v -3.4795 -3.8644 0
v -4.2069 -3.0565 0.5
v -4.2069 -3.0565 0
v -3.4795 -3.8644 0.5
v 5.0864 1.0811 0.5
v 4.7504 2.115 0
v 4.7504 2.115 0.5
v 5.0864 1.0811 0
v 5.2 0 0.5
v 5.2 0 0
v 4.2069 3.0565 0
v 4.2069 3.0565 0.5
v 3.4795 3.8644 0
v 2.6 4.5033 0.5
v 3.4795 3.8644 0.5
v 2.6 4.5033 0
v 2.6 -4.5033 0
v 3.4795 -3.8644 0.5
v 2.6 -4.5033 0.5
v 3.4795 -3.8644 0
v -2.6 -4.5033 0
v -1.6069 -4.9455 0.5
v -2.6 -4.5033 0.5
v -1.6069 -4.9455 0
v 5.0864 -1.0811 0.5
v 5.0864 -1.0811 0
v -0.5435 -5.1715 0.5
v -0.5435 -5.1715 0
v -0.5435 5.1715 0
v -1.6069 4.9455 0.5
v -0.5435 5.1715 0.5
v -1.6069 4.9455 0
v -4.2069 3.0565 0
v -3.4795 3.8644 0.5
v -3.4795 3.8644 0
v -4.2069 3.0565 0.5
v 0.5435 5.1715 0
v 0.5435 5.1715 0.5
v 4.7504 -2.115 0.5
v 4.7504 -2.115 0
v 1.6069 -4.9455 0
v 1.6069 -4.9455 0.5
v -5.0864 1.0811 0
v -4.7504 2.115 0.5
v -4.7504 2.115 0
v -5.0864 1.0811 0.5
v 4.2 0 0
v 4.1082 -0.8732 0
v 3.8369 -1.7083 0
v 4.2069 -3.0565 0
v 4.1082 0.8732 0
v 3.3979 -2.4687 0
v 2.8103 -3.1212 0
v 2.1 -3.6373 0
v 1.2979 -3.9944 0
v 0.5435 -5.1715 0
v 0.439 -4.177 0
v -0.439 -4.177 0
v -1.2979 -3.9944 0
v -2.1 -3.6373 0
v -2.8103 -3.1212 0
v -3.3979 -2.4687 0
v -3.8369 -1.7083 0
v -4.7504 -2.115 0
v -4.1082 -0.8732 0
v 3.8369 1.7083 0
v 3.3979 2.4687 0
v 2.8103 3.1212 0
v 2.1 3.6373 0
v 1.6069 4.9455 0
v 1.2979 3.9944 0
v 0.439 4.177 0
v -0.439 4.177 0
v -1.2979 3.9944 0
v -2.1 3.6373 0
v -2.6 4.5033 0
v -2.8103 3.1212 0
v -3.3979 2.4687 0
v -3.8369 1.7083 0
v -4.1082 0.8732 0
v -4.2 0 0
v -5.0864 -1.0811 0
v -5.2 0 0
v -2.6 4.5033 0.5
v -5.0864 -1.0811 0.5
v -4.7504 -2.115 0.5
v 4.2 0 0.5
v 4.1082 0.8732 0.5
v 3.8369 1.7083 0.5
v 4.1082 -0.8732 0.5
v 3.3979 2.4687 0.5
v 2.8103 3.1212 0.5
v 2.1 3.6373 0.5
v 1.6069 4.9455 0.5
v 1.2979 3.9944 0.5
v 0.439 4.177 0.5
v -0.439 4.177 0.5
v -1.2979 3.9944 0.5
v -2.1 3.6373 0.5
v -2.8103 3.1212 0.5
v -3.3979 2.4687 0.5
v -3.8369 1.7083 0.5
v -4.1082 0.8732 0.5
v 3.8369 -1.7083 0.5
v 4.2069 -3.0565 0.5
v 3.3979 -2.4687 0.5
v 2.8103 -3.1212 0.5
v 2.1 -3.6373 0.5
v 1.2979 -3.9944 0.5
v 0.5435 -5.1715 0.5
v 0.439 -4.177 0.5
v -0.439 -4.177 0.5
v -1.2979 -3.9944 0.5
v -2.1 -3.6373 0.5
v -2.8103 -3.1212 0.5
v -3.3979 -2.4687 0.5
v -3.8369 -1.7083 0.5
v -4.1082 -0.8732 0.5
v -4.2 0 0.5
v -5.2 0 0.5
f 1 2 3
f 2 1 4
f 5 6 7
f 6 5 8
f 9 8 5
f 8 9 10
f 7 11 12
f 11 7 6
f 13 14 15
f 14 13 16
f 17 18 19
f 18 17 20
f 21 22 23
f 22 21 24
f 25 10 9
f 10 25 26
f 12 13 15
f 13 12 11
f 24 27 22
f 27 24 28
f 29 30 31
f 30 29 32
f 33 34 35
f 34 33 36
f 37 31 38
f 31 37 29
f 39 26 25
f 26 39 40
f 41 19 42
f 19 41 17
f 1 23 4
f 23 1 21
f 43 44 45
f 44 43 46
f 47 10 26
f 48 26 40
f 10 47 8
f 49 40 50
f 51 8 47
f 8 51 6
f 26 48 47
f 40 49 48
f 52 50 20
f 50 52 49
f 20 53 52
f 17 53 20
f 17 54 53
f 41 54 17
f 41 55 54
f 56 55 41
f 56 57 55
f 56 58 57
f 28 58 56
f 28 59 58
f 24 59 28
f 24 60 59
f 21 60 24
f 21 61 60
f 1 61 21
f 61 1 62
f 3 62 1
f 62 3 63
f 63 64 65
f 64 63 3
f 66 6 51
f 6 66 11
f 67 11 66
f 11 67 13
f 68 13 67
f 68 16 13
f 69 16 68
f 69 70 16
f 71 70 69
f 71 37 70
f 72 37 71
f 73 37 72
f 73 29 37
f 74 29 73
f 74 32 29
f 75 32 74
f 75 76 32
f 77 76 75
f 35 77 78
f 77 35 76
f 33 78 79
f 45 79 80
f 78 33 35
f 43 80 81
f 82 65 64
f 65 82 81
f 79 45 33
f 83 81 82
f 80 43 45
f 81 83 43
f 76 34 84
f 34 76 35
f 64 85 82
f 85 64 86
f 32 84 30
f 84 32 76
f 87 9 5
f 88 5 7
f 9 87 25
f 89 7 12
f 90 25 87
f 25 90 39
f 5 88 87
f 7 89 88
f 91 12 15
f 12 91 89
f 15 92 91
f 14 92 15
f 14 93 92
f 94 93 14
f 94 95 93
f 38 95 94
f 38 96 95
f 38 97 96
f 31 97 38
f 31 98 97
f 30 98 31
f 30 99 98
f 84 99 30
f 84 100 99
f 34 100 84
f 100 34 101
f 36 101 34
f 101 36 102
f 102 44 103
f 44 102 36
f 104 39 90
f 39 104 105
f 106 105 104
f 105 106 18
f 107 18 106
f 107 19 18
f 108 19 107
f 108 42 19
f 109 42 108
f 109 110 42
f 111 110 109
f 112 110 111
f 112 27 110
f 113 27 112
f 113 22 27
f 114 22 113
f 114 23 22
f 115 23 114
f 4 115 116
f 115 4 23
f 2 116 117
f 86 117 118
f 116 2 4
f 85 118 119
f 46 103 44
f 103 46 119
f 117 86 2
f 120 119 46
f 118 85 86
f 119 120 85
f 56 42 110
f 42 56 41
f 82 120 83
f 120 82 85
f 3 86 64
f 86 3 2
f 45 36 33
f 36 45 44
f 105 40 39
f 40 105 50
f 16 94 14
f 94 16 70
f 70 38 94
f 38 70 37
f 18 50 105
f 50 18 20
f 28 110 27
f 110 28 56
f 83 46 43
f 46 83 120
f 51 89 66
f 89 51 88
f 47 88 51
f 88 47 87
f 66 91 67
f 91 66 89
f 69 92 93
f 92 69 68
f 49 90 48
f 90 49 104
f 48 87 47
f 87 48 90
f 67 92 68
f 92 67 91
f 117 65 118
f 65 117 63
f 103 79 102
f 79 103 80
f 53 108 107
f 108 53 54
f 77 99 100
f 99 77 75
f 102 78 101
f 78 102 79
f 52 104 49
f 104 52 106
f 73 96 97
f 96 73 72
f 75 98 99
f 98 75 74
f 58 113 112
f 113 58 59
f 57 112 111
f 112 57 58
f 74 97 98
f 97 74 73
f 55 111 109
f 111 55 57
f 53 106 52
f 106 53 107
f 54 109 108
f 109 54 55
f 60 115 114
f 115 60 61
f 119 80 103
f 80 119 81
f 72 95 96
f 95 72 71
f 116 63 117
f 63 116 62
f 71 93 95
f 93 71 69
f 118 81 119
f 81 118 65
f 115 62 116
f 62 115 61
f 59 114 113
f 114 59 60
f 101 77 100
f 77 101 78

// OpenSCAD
// file: common_parts.scad
include <tunable_constants.scad>;
common_flat_screw_tap();
module common_flat_screw_tap(l = 10, l2 = 0) {
    // l2 is amount of the screw that are bigger for sliding through the hole
    tap_z = 1.9;
    union() {
        cylinder(d = C_M3_DIAMETER_THREAD, h= l);
        cylinder(d = C_M3_DIAMETER, h= l2);
        translate([0,0,-0.1+0.1]) cylinder(d1 = 6.5, d2= C_M3_DIAMETER_THREAD, h= tap_z);
        translate([0,0,-0.1]) cylinder(d = 6.5, h= 0.3);
    }
}

module common_button_screw_tap(l = 10, l2 = 0) {
    
    tap_z = 1.1;
    union() {
        cylinder(d = C_M3_DIAMETER_THREAD, h= l);
        cylinder(d = C_M3_DIAMETER, h= l2);
        translate([0,0,-4]) cylinder(d = 6, h=4);
    }
}

module roundedcube(xdim ,ydim ,zdim,rdim){
    hull(){
        fn=30;
        translate([rdim,rdim,0]) cylinder(r=rdim, h=zdim, $fn=fn);
        translate([xdim-rdim,rdim,0])cylinder(r=rdim, h=zdim, $fn=fn);

        translate([rdim,ydim-rdim,0]) cylinder(r=rdim, h=zdim, $fn=fn);
        translate([xdim-rdim,ydim-rdim,0]) cylinder(r=rdim, h=zdim, $fn=fn);
    }
}
// file: wingadapter.scad
// Wing adapter with body post

$fs = 0.1;
yd = 10;
m4_d = 4.2;
m3_d = 3.1;
s_dist = 14.5;
post_dist = 24;
lip_dist = 28;
hh = 9.5;
mount_dist = 54;

xx = 24;

m_x1 = 14.8;
m_x2 = 7.9;
m_y = 32;
m_z1 = 2.5;
m_z2 = 2.5;

wingadapter_p();

module wingadapter_p() {
    difference() {
        union() {
            difference() {
                union() {
                    hull() {
                        translate([0,0,0]) cylinder(d = yd, h=hh);
                        translate([0,s_dist,0]) cylinder(d = yd+5, h=hh);
                        translate([0,post_dist,0]) cylinder(d = yd, h=hh);
                    }
                    hull() {
                        translate([0,s_dist,0]) cylinder(d = yd+5, h=hh);
                        translate([-xx/2,lip_dist,0]) cube([xx, 6, hh]);
                        translate([0,mount_dist,0]) cylinder(d = 3, h=hh);
                    }
                    translate([-xx/2,lip_dist,0]) cube([xx, 6, hh+2.5]);
                    
                    
                    
                }
                translate([-50/2,mount_dist-m_y/2,0]) cube([50, m_y, 100]);
            }
            translate([-m_x1/2,mount_dist-m_y/2,0]) cube([m_x1, m_y, m_z1]);
            translate([-m_x2/2,mount_dist-m_y/2,m_z1]) cube([m_x2, m_y, m_z2]);
        }
        // screw holes
        translate([0,0,0])      cylinder(d = m4_d, h=hh);
        translate([0,s_dist,0]) cylinder(d = m4_d, h=hh);
        translate([0,post_dist,0]) cylinder(d = m3_d, h=hh);
        translate([0,mount_dist,0])  cylinder(d = m3_d, h=hh+m_z1+m_z2);
        
        translate([0,post_dist,4]) cylinder(d = 6.5, h=hh);
        
        //muttrar
        translate([0,mount_dist,0])  cylinder(d=6.5, h=2.5, $fn=6);
        
        translate([0,0,0]) rotate([0,0,360/12]) cylinder(d=8, h=4, $fn=6);
        translate([0,s_dist,0]) rotate([0,0,360/12]) cylinder(d=8, h=4, $fn=6);
    }
}
// file: caster_hub.scad
//
use <lexan_nose.scad>
use <common_parts.scad>
include <tunable_constants.scad>;
$fs=0.1;

caster = 4;
camber = 2;

kingpin_d = C_KINGPIN_LOOSE; //3.5;

space = 19; // mellanrummet inuti hubben

m3_d = 3; // hål som en skruv inte ska fästa i
m3_d_s = 2.8; // hål som skruven ska skapa gängor i

color("red")%nose_p();
translate([0,240,0]) % union() {
    upper_arm();
    mirror([1,0,0]) upper_arm(); 


    lower_arm();
    mirror([1,0,0]) lower_arm();

    color("yellow") arm_plate();
    color("green") translate([0,-115,30]) upper_arm_plate_p();
}

translate([-62,240-25,23]) caster_p();
caster_p();

 rotate([0,0,180]) translate([-90, 275, -20])  %import("ref/testhub.stl", convexity=10);
 rotate([0,0,180+45]) translate([-90, 275, -20])  %import("ref/testhub.stl", convexity=10);
 rotate([0,0,180-30]) translate([-90, 275, -20])  %import("ref/testhub.stl", convexity=10);
module caster_p() {
    difference() {
        union() {
            hull() {
                translate([0,-1,space/2]) cylinder(d=10, h=3);
                translate([0,-15/2,space/2]) cube([10,15,3]);
            }
            hull() {
                translate([0,1,-space/2-3]) cylinder(d=10, h=3);
                translate([0,-15/2,-space/2-3]) cube([10,15,3]);
            }
            
            hull() {
                translate([10+2.5, 0, space/2-3]) cylinder(d=8, h=3);
                translate([10+2.5+5, -12, space/2-3]) cylinder(d=8, h=3);
            }
            hull() {
                translate([10,15/2-10,-space/2]) cube([1,10,space]);
            
                translate([10+2.5,0,-space/2]) cylinder(d=8, h=space);
            }
        }
        rotate([0,camber,0]) rotate([caster,0,0]) translate([0,0,-50]) cylinder(d=kingpin_d, h = 100);
        %rotate([0,camber,0]) rotate([caster,0,0]) translate([0,0,-50]) cylinder(d=kingpin_d, h = 100);
        
        translate([10+2.5,0,-space/2-10]) cylinder(d=m3_d_s, h=space+50);
        
        translate([-25, 10, -25]) rotate([0,0,-10]) cube([50,50,50,]);
    }
}
module caster_rod() {

    rotate([0,camber,0]) rotate([caster,0,0]) translate([0,0,-50]) cylinder(d=kingpin_d, h = 100);
    //%rotate([0,camber,0]) rotate([caster,0,0]) translate([0,0,-50]) cylinder(d=kingpin_d, h = 100);
        

}
caster_rod();

module caster_visual() {
    
     rotate([0,0,180]) translate([-90, 275, -20])  %import("ref/testhub.stl", convexity=10);
 rotate([0,0,180+45]) translate([-90, 275, -20])  %import("ref/testhub.stl", convexity=10);
 rotate([0,0,180-30]) translate([-90, 275, -20])  %import("ref/testhub.stl", convexity=10);
}
// file: lexan_side_stab.scad
// file for viewing parts when edit

use <lexan_main-chassie.scad>
use <lexan_nose.scad>

%translate([-115, -67, -93])  rotate([0,-90,-90]) import("ref/Cradle.stl", convexity=10);

color("green") side_spring_plate_p();


color("lightblue")main_chassie_p();

battery_plate_p();


translate([0,0,5]) side_stab_p();

module side_stab_p() {
    
    
    $fs=0.1;
    
    s_x1 = 36;
    s_x2 = 50;
    s_z = 7;
    
    
    difference() {
        union() {
            translate([s_x1,-8,-s_z/2]) cube([5,10,s_z]);
            translate([s_x1,0,-s_z/2]) cube([s_x2-s_x1,5,s_z]);
            hull() {
                translate([s_x2,  60 , -s_z/2]) cube([3,6,s_z]);
                translate([s_x2,  0 , -s_z/2]) cube([2,10,s_z]);
            }
        }
        translate([s_x1-1,-4,0])rotate([0,90,0]) cylinder(d=3, h=10);
        translate([s_x2-1,62,0])rotate([0,90,0]) cylinder(d=3, h=10);
    }
}

module side_stab2_p() {
    
    
    $fs=0.1;
    
    s_x1 = 53;
    s_x2 = 53;
    s_z = 7;
    
    
    difference() {
        union() {
            translate([s_x1,-8,-s_z/2]) cube([2,10,s_z]);
            translate([s_x1,0,-s_z/2]) cube([s_x2-s_x1,5,s_z]);
            hull() {
                translate([s_x2,  61 , -s_z/2]) cube([2,6,s_z]);
                translate([s_x2,  0 , -s_z/2]) cube([2,10,s_z]);
            }
        }
        translate([s_x1-1,-4,0])rotate([0,90,0]) cylinder(d=3, h=10);
        translate([s_x2-1,63,0])rotate([0,90,0]) cylinder(d=3, h=10);
    }
}
// file: tunable_constants.scad
// Change parameters to fit your printer and slicer differences

C_M3_DIAMETER = 3.1; // size of a hole that a M3 screw will slide through
C_M3_DIAMETER_THREAD = 2.8; // size of a hole that a M3 screw will create own threads in

C_M3_NUT = 7;

C_KINGPIN_LOOSE = 3.5; // The hole for kingpin in the arms that are suposed to slide
C_KINGPIN_SNUG = 3.3; // The hole in the steering hub where the kingpin is suposed to be tightly locked with a screw

C_M4_NUT = 8.4;

C_M4_DIAMETER = 4.1; // size of a hole that a M4 screw will slide through
C_M4_DIAMETER_THREAD = 3.8; // size of a hole that a M4 screw will create own threads in

    b_12mm_tol = 0.3; // tolerance for bearing with 12mm diameter

C_12MM_BEARING_D = 12+b_12mm_tol; // Size of a hole that hold a 12mm bearing
C_12MM_BEARING_H = 3.5;

C_8MM_LOOSE = 8.7; // Loose fitting that will guarantie that it will not touch
C_8MM_TIGHT = 8.2; // Tight fitting for indrive etc
C_8MM_FIT = 8.5; // Perfect fit for it to be removable but not by much force, used for left wheel mount
// main file
// file for viewing parts when edit
include <tunable_constants.scad>;

use <lexan_main-chassie.scad>
use <lexan_nose.scad>
use <lexan_side_stab.scad>
use <caster_hub.scad>
use <wingadapter.scad>
use <common_parts.scad>


$fs=0.1;

spacer(dd=8.4, wall=1, hh=0.5);


module torus(dd=1, wall=1, hh=1) {
        difference() {
            cylinder(d=dd, h=hh);
            cylinder(d=dd-wall*2, h=hh);
        }
    
}
module spacer(dd=1, wall=1, hh=1) {
        difference() {
            cylinder(d=dd+wall*2, h=hh);
            cylinder(d=dd, h=hh);
        }
    
}
